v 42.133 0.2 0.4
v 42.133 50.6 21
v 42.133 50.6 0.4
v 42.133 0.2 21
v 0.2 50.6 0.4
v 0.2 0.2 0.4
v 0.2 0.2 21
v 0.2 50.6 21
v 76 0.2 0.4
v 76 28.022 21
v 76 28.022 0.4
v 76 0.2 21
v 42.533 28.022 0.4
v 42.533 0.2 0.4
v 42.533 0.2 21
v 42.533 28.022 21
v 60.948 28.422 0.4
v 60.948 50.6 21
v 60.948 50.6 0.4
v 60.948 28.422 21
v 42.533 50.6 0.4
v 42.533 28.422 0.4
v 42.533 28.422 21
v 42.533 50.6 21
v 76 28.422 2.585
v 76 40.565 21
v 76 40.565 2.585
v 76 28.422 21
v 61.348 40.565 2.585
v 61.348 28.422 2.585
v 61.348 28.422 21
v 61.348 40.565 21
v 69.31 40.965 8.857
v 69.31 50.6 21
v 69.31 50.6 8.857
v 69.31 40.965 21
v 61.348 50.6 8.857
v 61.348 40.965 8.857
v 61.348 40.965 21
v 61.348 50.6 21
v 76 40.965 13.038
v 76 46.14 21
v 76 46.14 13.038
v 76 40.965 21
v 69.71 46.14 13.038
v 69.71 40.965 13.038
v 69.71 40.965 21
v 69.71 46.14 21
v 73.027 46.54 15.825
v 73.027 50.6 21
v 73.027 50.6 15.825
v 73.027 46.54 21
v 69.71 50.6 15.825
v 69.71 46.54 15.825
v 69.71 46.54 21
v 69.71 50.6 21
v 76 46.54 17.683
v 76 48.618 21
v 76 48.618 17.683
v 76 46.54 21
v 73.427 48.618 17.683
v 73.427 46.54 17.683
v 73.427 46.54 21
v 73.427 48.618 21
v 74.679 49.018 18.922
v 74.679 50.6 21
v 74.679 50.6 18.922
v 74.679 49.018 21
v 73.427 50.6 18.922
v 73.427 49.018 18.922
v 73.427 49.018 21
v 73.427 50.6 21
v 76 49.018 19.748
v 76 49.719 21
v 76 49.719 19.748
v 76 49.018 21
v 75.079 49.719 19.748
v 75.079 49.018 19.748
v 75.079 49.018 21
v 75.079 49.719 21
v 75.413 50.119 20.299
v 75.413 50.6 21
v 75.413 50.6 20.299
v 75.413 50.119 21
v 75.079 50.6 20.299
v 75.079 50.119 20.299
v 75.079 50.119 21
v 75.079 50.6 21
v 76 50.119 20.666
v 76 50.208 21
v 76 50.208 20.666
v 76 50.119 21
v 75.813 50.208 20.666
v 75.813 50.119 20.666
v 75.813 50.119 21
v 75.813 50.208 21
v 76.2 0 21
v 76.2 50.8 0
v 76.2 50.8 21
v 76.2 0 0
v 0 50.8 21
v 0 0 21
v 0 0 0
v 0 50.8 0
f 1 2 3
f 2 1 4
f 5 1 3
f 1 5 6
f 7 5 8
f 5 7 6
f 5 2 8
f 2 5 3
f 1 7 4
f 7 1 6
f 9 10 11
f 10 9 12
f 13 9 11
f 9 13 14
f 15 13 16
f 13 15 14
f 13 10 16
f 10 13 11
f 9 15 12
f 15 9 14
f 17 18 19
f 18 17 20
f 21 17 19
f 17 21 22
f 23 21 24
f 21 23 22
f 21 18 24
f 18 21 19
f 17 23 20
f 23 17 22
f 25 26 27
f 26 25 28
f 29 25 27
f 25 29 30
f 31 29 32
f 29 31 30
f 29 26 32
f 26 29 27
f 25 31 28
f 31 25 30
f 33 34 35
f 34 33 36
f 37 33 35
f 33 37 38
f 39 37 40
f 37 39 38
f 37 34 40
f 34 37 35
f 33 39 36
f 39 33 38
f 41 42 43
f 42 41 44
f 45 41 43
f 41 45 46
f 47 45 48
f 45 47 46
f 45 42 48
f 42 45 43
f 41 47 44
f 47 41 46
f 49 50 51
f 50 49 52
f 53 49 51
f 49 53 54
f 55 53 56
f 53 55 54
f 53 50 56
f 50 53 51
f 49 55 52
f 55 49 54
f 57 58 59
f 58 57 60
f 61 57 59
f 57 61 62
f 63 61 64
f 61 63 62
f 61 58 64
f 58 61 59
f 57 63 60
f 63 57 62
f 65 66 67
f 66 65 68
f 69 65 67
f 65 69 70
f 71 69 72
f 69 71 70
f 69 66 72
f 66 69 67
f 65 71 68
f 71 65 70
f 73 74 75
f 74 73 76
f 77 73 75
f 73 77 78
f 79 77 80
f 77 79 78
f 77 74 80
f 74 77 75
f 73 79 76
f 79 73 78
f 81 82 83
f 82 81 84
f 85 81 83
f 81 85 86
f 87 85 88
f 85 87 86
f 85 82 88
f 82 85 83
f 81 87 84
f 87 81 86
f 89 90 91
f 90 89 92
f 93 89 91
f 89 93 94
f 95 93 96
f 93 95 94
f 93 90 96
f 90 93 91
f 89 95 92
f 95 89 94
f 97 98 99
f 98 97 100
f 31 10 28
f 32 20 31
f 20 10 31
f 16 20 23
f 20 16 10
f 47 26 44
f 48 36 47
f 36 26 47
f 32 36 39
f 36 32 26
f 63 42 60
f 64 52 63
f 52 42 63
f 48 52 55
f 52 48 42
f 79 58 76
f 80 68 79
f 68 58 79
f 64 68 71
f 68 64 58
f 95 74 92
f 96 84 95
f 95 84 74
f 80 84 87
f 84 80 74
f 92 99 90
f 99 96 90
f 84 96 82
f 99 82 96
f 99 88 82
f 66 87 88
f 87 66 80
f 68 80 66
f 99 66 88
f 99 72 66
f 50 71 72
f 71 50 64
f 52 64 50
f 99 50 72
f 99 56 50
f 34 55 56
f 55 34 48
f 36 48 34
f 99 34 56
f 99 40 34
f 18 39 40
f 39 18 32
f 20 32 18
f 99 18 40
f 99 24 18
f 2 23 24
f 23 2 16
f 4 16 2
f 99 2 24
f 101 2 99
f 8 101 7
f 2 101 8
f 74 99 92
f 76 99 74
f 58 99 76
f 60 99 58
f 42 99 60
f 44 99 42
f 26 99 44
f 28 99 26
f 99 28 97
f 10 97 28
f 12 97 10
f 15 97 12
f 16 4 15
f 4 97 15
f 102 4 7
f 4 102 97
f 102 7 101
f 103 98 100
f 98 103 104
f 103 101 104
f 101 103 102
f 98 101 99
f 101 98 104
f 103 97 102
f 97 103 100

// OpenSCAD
//use <gridfinity_modules.scad>

/* [Constants] */
inch = 25.4;

/* [Options] */
num_x = 3;
num_y = 2;
twt=.4;
h=21;
max_aspect_ratio=1.5; //prevents holes from getting too deep

/*
// omg this is so complicated
//gridfinity constants
bevel2_top = 5;
gridfinity_pitch = 42; //xy spacing
corner_radius = 3.75; //outside of box
// each bin is undersized by this much
gridfinity_clearance = 0.5;  
*/

/* [Calculated] */

n=15; // todo: calculate this explicitly
b=num_x/num_y;
w=inch*num_y;
assert(b>1);
a=b-1/b;

module cubette(xyz, twt=twt){
  translate([1,1,0]*twt/2) cube(xyz-twt*[1,1,0]);
}


function sum(x) = x * [for(i=[1:len(x)]) 1];

module fractal_organizer(){
  difference(){
    cube([b*w,w,h]);
    translate([0,0,twt]) for(i=[0:n/2-1]){
      //left to right along top edge
      x1=w*a*b^(-2*i);
      y1=w*b^(-2*i);
      z1=min(h,x1*max_aspect_ratio);
      
      dx1= i==0 ? 0 : w*a*sum([for(j=[0:i-1]) b^(-2*j)]);
      dy1= w-y1;
      translate([dx1,dy1,h-z1]) cubette([x1,y1,z1]);
      
      //bottom to top along right edge
      x2=w*b^(-2*i-1);
      y2=w*a*b^(-2*i-1);
      z2=min(h, y2*max_aspect_ratio);
      
      dx2=w*b-x2;
      dy2= i==0 ? 0 : w*a*sum([for(j=[0:i-1]) b^(-2*j-1)]);
      translate([dx2,dy2,h-z2]) cubette([x2,y2,z2]);
    }
  }
}

fractal_organizer();
